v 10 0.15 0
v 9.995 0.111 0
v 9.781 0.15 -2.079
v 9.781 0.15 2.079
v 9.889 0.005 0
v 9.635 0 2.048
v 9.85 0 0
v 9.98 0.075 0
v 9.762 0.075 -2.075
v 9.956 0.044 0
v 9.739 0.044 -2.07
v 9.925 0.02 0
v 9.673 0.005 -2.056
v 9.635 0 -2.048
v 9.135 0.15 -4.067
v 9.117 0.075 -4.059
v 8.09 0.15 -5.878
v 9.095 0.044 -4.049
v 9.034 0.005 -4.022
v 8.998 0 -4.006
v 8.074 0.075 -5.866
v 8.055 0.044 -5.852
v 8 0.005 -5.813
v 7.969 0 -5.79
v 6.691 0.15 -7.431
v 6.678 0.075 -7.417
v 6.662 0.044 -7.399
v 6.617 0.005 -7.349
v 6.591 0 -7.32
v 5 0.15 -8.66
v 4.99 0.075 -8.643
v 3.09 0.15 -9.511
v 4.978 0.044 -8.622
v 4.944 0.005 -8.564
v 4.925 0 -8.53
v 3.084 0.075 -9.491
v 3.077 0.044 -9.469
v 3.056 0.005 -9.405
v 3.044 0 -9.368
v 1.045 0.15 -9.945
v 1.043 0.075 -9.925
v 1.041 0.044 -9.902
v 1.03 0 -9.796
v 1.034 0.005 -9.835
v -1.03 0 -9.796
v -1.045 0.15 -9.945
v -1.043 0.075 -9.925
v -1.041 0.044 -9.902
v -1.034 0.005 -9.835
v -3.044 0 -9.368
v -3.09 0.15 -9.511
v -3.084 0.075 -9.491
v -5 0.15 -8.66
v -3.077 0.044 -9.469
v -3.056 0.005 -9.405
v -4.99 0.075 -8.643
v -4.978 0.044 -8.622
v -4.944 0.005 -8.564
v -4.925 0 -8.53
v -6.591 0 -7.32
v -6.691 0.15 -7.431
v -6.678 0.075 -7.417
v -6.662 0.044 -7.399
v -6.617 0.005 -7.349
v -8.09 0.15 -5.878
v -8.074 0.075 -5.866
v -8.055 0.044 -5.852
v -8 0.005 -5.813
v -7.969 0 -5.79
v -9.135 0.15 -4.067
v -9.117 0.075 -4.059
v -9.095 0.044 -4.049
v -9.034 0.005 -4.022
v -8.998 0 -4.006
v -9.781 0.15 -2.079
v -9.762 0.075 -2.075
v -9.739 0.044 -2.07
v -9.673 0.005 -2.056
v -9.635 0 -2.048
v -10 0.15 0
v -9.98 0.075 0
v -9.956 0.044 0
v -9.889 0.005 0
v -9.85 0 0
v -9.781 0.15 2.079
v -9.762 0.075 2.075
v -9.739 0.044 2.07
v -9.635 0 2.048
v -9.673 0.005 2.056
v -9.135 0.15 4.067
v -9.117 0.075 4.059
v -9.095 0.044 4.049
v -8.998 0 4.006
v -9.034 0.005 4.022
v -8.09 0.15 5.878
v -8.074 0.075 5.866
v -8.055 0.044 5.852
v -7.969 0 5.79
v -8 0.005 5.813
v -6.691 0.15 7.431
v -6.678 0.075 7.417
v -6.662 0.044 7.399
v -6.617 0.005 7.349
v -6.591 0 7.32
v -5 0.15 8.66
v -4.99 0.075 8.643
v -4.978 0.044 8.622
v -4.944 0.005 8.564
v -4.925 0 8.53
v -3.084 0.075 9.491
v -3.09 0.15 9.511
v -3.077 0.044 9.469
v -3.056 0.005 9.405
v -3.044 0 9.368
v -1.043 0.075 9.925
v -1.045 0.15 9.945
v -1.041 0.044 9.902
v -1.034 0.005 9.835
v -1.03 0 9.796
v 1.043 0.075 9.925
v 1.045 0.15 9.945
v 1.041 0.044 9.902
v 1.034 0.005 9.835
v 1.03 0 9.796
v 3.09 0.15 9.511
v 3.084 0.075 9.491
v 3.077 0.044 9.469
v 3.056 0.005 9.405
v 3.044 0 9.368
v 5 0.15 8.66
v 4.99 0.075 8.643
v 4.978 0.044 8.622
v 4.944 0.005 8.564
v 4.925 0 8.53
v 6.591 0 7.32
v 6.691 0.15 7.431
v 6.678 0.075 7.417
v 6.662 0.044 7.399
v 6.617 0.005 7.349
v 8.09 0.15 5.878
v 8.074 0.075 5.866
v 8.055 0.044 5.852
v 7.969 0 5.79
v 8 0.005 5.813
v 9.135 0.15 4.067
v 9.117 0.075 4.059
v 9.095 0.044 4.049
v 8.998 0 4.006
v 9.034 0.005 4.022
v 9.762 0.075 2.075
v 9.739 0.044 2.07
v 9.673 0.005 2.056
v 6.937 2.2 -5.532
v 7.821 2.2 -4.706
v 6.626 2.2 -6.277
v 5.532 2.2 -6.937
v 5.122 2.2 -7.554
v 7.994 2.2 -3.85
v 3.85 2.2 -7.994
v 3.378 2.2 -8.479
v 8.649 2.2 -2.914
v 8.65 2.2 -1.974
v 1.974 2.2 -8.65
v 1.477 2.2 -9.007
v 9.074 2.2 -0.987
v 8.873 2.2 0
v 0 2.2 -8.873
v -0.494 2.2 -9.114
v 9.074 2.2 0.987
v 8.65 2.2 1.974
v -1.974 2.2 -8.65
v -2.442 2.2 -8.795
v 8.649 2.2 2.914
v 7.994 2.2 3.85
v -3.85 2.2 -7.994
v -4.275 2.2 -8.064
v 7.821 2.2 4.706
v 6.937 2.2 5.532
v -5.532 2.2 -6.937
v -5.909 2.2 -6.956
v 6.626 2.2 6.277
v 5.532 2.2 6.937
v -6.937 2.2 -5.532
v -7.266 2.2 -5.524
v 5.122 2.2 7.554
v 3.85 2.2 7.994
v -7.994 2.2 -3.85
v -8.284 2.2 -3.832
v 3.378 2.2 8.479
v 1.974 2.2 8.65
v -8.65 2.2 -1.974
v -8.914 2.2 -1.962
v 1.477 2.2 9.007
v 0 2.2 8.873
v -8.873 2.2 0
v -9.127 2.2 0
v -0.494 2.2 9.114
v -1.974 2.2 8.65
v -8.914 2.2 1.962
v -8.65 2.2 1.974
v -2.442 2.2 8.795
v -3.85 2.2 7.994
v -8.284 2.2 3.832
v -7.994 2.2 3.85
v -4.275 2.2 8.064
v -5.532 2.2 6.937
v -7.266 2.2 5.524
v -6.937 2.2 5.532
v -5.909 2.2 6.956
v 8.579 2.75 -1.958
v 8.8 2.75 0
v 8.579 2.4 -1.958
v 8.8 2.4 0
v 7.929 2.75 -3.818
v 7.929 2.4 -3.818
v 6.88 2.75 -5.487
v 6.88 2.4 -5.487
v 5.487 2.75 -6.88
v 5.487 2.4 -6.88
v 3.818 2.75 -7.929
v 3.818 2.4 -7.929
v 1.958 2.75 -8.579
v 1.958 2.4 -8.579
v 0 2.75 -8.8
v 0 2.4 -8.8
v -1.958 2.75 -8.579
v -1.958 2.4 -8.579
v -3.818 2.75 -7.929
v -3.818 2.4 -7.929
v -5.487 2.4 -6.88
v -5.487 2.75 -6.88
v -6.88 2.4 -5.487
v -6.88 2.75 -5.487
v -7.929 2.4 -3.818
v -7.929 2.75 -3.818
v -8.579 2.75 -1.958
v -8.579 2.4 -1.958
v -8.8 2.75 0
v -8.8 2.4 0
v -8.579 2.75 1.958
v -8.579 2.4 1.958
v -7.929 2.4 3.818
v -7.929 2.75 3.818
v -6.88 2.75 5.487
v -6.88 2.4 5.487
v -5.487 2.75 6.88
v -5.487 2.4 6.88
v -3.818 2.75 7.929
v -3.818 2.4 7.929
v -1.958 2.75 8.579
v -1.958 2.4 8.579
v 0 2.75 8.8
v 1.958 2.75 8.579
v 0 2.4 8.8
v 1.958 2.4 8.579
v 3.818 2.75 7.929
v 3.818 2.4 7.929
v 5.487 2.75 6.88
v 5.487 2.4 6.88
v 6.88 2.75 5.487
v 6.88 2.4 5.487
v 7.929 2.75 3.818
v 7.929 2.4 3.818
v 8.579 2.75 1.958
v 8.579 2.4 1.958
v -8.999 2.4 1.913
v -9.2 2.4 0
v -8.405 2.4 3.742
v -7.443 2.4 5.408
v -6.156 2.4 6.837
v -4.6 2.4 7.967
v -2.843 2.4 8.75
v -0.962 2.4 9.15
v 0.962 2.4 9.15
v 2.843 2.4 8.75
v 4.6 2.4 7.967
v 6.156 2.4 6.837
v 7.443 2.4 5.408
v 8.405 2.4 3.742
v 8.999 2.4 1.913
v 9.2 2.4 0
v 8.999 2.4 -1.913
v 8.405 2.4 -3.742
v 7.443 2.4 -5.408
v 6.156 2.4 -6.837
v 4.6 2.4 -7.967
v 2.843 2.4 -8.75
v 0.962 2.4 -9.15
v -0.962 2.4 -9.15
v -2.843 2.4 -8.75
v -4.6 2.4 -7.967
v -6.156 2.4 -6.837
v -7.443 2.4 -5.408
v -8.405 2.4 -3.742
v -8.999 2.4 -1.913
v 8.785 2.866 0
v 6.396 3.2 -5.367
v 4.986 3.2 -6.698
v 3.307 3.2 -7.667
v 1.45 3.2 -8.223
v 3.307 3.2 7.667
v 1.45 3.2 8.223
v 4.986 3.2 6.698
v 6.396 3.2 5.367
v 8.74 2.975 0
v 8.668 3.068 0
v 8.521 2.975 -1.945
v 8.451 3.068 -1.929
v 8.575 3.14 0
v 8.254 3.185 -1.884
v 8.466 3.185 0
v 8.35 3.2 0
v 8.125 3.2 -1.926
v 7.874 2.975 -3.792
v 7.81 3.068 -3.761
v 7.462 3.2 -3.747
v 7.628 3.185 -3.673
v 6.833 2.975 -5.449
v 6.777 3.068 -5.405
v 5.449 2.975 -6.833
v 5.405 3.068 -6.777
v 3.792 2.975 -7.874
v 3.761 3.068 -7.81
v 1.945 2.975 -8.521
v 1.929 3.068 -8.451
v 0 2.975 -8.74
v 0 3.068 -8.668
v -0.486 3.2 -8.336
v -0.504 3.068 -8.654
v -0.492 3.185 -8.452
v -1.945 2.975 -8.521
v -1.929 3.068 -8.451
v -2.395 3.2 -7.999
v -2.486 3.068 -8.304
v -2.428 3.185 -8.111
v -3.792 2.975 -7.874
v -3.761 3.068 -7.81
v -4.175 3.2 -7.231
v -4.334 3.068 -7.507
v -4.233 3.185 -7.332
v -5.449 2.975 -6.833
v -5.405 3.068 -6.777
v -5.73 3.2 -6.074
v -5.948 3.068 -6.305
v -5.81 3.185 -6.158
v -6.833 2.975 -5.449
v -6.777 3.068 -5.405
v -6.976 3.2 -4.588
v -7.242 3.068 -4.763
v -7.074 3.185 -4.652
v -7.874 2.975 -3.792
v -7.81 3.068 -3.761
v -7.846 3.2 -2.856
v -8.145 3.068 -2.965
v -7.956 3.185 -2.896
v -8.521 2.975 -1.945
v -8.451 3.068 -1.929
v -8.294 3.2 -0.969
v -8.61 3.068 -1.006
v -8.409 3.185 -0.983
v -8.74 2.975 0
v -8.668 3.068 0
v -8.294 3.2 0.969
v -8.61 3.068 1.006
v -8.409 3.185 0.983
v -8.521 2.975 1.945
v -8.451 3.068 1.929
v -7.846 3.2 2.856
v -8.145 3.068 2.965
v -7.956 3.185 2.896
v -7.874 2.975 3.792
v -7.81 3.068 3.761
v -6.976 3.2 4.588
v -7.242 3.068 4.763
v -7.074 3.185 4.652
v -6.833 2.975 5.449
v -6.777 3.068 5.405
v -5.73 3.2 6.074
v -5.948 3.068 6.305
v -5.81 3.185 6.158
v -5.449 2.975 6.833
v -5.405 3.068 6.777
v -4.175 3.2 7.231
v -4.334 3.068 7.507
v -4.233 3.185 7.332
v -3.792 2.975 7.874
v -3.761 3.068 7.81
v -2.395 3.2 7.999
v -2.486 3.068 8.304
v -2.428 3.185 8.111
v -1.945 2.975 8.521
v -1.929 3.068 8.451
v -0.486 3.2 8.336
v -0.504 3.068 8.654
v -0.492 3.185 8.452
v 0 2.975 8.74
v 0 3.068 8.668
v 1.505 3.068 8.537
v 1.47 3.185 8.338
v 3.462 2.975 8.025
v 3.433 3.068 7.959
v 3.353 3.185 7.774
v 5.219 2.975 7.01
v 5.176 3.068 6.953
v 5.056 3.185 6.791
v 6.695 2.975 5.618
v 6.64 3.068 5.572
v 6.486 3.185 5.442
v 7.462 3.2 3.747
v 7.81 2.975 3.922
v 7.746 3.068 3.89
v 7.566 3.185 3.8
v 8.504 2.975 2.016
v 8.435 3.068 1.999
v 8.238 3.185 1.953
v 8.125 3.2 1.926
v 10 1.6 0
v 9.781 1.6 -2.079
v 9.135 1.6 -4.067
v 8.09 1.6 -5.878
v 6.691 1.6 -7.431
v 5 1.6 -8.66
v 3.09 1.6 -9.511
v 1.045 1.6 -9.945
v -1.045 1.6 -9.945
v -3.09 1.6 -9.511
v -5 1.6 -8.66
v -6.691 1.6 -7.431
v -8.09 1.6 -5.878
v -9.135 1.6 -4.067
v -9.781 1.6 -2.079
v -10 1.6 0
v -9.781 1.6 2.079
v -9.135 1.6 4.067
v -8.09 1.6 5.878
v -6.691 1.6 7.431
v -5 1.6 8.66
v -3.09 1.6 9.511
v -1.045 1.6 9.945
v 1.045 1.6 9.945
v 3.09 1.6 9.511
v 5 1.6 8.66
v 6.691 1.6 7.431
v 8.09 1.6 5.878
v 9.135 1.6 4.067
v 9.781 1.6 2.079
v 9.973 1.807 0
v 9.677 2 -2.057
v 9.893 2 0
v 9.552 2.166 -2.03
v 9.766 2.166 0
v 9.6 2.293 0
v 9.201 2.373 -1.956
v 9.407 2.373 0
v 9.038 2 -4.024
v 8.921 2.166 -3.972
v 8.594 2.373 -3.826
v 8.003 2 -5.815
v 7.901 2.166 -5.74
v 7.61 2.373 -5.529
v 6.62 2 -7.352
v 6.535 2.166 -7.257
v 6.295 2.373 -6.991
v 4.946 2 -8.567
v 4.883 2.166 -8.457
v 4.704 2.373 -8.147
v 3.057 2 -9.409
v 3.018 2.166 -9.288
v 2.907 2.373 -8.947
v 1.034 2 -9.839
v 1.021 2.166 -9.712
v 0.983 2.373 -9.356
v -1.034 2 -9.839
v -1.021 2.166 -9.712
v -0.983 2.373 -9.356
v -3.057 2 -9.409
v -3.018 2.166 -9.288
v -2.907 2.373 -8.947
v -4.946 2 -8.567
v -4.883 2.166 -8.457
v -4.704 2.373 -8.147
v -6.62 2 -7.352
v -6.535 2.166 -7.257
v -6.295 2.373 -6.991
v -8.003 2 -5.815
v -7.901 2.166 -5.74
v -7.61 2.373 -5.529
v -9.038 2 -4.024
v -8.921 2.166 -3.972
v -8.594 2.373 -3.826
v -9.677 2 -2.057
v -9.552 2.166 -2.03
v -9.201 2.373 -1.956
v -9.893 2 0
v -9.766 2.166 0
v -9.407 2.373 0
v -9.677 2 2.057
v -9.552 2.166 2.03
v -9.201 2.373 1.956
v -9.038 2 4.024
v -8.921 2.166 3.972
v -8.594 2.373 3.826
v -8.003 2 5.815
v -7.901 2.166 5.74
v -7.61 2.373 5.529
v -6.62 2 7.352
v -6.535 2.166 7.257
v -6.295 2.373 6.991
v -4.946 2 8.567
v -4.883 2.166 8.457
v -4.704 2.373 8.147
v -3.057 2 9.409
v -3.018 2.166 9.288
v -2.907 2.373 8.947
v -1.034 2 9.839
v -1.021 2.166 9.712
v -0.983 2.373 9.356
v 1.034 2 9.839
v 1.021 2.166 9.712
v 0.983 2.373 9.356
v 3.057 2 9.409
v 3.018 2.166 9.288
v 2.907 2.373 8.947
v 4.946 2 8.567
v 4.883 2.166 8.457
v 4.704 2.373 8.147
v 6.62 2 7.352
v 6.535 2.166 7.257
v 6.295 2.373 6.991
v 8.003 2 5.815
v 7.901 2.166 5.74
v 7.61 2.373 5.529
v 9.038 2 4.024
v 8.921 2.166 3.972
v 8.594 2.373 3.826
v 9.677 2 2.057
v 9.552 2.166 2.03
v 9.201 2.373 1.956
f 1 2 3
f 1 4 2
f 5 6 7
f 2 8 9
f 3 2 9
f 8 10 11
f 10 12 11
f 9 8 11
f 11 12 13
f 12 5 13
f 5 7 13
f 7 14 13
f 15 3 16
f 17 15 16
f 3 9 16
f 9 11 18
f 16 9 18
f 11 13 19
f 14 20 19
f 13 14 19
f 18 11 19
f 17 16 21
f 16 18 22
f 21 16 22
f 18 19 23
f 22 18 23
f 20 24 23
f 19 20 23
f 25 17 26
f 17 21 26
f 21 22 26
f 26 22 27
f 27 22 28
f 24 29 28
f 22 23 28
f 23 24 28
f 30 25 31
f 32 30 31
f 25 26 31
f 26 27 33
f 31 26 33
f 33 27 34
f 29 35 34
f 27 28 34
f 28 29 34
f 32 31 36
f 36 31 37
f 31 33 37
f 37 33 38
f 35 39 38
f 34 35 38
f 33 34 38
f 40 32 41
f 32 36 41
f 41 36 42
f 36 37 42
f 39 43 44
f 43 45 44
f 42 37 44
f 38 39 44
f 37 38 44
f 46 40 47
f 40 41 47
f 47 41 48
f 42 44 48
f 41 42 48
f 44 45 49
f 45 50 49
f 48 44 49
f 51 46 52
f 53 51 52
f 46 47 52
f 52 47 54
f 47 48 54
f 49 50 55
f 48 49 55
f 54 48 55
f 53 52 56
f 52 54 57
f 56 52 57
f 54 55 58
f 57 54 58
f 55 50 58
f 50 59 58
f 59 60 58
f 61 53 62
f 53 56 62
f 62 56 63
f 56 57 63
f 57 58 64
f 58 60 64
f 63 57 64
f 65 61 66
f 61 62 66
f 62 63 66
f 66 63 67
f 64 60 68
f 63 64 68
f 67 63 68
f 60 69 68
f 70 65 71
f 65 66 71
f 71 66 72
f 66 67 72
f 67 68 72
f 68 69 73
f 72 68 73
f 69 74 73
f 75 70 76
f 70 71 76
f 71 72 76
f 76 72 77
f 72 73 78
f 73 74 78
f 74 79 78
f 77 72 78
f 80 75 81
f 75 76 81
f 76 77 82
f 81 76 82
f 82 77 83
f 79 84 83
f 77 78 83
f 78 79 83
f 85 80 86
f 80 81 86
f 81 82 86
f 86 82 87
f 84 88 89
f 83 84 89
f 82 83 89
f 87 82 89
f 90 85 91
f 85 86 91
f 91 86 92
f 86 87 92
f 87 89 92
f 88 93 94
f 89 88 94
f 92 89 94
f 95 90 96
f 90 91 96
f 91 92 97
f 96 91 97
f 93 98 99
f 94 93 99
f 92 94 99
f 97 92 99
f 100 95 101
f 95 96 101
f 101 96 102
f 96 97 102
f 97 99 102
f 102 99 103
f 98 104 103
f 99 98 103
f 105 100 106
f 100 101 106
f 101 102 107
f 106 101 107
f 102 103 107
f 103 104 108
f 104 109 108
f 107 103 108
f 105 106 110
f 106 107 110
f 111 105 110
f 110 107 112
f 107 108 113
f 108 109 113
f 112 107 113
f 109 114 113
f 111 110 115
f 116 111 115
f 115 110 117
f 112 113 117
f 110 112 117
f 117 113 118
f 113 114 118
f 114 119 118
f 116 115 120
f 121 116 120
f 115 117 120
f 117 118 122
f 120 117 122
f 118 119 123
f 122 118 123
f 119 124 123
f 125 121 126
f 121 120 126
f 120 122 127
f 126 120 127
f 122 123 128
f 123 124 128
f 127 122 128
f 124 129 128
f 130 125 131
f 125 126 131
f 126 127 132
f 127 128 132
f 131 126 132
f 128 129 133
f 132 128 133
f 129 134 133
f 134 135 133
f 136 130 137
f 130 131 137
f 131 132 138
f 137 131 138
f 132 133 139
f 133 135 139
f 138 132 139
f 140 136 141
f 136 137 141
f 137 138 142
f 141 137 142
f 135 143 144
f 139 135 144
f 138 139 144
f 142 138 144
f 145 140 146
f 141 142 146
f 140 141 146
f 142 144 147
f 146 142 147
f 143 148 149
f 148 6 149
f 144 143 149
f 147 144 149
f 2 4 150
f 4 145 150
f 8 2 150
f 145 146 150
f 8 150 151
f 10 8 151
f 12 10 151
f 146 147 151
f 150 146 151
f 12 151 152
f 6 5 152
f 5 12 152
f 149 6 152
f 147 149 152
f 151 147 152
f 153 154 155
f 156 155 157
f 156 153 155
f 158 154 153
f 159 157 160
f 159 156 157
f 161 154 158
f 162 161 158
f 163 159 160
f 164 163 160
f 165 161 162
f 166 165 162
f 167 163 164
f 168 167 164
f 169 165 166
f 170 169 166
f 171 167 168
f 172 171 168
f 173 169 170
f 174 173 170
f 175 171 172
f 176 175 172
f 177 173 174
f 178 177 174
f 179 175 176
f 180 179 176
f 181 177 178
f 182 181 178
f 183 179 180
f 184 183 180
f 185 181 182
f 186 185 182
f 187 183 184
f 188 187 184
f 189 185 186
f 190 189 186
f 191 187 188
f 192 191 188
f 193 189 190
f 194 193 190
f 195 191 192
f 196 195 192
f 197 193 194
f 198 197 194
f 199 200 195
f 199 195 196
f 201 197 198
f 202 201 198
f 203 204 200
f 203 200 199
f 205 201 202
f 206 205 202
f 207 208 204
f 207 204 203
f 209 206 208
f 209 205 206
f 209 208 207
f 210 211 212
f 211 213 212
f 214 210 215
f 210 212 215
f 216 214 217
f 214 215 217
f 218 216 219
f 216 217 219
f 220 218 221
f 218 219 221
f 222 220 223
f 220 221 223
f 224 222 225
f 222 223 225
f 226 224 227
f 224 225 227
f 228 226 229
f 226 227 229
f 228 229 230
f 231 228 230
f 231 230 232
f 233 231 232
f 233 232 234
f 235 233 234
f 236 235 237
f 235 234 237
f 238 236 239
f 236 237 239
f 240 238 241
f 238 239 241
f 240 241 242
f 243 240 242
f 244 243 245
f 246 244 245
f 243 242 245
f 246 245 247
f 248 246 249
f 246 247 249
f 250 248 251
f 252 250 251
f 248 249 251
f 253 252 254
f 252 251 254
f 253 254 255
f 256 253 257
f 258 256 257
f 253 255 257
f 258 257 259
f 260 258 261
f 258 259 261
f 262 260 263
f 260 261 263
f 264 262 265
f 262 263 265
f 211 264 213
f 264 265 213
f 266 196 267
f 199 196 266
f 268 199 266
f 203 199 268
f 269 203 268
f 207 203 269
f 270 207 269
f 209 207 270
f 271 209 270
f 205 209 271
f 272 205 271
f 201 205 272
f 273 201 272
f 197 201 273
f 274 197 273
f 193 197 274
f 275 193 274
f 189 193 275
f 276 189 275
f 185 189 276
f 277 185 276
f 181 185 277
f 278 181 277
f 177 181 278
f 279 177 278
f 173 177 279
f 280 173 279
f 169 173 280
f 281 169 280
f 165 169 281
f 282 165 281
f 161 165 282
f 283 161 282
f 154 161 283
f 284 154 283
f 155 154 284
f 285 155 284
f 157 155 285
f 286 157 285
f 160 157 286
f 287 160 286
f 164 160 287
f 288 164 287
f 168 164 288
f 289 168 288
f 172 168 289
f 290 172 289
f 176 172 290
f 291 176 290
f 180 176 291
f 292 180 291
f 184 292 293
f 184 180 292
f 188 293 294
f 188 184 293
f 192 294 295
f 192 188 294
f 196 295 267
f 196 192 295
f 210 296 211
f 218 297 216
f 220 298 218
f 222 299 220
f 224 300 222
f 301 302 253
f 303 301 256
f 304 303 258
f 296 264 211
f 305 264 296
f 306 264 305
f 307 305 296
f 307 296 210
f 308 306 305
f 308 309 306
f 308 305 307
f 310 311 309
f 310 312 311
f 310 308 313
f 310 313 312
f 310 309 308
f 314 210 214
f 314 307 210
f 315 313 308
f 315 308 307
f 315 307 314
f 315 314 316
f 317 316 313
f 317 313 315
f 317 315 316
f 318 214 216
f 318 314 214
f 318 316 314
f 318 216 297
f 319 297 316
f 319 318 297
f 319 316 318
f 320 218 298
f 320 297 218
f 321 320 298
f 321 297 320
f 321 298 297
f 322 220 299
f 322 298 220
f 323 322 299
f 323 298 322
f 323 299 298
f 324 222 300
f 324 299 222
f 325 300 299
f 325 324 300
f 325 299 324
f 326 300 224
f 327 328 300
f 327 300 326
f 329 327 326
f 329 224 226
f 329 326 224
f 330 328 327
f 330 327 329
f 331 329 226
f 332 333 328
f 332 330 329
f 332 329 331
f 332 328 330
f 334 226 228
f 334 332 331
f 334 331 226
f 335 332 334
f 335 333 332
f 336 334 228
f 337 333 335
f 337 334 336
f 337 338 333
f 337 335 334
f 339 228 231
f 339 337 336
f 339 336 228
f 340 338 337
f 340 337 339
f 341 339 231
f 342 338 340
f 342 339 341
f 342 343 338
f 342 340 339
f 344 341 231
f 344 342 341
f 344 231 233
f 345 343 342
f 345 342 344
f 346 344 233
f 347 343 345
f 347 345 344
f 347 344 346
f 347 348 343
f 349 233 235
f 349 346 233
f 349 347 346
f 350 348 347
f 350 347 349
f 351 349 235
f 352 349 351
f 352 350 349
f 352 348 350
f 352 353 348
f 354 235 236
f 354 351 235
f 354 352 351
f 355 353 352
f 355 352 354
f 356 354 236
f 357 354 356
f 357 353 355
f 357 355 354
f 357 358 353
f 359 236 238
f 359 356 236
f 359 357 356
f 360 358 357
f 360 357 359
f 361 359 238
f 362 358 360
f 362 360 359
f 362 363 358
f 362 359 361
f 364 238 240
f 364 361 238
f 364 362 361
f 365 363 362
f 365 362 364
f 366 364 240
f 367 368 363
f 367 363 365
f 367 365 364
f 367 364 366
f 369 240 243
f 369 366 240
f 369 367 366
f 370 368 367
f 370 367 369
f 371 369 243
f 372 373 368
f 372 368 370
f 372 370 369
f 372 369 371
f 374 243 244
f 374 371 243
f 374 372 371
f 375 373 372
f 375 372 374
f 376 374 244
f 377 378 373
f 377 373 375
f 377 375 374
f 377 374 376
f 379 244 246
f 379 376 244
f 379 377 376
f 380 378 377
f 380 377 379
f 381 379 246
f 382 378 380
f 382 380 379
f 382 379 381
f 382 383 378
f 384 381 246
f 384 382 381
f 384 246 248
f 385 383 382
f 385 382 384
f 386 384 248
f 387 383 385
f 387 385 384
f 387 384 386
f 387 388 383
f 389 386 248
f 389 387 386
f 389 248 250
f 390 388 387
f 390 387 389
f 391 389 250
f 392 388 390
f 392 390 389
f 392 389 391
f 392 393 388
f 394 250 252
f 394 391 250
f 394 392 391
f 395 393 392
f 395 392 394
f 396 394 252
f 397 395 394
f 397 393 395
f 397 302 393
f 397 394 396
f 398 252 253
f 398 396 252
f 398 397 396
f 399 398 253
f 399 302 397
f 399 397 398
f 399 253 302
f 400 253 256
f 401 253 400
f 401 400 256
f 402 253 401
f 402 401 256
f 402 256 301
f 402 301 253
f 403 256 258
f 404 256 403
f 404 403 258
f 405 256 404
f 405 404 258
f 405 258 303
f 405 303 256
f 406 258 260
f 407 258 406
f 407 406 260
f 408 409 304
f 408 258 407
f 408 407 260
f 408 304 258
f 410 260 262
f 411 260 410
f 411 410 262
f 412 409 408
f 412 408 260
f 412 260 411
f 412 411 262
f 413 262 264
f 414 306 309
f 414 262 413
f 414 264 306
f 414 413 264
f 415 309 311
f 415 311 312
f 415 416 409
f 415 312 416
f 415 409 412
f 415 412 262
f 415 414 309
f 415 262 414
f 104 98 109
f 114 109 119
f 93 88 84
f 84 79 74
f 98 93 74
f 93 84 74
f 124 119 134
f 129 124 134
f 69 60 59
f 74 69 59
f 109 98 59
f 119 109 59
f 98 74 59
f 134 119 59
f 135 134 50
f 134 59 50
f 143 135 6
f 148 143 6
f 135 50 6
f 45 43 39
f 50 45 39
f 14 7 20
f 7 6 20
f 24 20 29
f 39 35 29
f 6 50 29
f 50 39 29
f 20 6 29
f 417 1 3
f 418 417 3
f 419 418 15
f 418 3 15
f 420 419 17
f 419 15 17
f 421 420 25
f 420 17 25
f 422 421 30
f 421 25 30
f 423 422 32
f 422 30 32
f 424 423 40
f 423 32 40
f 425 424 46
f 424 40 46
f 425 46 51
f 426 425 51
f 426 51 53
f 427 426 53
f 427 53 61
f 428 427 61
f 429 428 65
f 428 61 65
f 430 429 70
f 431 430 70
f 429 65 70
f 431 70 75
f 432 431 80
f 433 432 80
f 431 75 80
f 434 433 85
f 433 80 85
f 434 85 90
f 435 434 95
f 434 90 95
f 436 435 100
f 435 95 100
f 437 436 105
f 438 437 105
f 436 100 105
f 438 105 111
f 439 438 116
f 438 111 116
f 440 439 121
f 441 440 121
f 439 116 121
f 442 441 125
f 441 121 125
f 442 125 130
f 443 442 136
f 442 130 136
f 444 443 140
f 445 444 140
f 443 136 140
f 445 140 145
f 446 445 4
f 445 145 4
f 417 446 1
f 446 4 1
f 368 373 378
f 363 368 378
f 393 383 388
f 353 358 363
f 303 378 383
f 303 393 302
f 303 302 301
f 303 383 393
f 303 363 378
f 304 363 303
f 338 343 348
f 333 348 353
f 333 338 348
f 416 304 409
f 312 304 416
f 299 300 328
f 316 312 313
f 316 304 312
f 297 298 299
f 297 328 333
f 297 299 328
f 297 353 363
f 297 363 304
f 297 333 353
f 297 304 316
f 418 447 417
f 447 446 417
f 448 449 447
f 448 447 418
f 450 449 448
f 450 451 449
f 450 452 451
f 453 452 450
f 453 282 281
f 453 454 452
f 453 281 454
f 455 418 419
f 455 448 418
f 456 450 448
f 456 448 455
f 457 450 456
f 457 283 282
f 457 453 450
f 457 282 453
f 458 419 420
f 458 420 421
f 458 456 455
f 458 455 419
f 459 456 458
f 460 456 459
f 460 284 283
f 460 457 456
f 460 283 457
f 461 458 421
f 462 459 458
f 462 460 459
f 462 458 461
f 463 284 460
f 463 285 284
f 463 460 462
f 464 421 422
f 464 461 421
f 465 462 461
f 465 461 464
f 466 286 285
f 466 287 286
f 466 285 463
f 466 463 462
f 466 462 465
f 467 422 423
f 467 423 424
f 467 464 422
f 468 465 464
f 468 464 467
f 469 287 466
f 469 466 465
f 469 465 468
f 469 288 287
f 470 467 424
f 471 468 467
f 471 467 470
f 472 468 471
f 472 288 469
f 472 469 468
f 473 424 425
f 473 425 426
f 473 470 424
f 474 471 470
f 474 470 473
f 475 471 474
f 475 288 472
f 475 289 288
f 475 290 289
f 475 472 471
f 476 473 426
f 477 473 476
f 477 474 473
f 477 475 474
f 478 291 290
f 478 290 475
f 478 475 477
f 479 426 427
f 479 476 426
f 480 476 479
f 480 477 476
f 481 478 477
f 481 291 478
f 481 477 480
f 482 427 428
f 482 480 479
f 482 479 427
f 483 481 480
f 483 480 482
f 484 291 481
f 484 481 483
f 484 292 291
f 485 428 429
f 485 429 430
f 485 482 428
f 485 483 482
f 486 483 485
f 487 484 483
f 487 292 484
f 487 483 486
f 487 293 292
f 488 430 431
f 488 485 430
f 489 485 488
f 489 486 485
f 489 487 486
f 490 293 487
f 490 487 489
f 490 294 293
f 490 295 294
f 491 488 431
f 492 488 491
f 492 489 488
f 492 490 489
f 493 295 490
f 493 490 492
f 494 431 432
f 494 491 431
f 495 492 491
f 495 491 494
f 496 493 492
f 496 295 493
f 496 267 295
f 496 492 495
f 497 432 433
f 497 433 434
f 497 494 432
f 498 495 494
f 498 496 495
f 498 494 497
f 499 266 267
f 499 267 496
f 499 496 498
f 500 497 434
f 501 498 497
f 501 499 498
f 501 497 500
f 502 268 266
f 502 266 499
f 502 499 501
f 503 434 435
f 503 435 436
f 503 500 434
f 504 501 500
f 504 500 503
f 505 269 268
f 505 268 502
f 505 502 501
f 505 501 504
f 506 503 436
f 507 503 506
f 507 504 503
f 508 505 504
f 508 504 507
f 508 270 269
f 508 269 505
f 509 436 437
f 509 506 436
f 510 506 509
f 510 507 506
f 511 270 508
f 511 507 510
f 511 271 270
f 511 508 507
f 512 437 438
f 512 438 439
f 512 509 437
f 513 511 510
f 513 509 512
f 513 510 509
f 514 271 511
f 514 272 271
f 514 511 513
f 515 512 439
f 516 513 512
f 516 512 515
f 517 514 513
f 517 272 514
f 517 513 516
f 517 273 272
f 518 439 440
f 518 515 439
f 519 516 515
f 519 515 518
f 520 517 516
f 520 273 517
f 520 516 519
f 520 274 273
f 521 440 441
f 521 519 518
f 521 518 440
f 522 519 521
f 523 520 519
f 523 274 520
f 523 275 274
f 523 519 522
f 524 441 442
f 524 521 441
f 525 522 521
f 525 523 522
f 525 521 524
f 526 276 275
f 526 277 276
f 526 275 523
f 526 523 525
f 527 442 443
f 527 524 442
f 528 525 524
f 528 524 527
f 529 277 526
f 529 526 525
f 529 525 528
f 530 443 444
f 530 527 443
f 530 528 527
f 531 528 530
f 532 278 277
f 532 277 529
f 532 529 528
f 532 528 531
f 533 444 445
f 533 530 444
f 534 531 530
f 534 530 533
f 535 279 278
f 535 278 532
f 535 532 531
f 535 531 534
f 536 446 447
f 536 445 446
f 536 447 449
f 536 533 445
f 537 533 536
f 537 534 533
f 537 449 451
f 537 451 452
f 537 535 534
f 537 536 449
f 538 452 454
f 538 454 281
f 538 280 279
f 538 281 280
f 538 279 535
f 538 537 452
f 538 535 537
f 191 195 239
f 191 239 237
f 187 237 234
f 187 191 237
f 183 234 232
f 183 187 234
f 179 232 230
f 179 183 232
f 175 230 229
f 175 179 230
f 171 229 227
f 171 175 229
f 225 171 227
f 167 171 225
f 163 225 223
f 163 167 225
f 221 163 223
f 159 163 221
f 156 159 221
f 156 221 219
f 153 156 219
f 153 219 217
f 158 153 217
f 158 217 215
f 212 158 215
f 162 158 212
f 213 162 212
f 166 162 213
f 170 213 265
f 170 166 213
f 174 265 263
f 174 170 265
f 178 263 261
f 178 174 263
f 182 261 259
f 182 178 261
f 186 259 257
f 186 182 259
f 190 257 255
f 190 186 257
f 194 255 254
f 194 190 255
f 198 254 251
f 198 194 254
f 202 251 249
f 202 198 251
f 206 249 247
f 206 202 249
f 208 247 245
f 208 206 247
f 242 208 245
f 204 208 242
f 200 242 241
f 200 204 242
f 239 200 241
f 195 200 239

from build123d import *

# Parameters (mm, degrees)
SKETCH1_R          = 10
EXTRUDE1_DEPTH     = 2.4
SKETCH2_R          = 8.8
EXTRUDE2_DEPTH     = 3.2
FILLET1_R          = 0.8
FILLET2_R          = 0.15
FILLET3_R          = 0.45
SKETCH3_R          = 9.2
SKETCH3_R_2        = 8.8
CUT_EXTRUDE2_DEPTH = 0.2
CUT_EXTRUDE2_TAPER = 20


with BuildPart() as part:
    # Sketch1 → Extrude1 (new body)
    with BuildSketch(Plane(origin=(0, 0, 0), x_dir=(1, 0, 0), z_dir=(0, 1, 0))):
        Circle(SKETCH1_R)
    extrude(amount=EXTRUDE1_DEPTH)

    # Sketch2 → Extrude2 (add)
    with BuildSketch(Plane(origin=(0, 0, 0), x_dir=(1, 0, 0), z_dir=(0, 1, 0))):
        Circle(SKETCH2_R)
    extrude(amount=EXTRUDE2_DEPTH)

    # Fillet1
    fillet1_edges = [part.edges().sort_by_distance(p)[0] for p in [
        (-10, 2.4, 0),
    ]]
    fillet(fillet1_edges, radius=FILLET1_R)

    # Fillet2
    fillet2_edges = [part.edges().sort_by_distance(p)[0] for p in [
        (-10, 0, 0),
    ]]
    fillet(fillet2_edges, radius=FILLET2_R)

    # Fillet3
    fillet3_edges = [part.edges().sort_by_distance(p)[0] for p in [
        (-8.8, 3.2, 0),
    ]]
    fillet(fillet3_edges, radius=FILLET3_R)

    # Sketch3 → Cut-Extrude2 (cut)
    with BuildSketch(Plane(origin=(0, 2.4, 0), x_dir=(-1, 0, 0), z_dir=(0, 1, 0))):
        Circle(SKETCH3_R)
        Circle(SKETCH3_R_2, mode=Mode.SUBTRACT)
    extrude(amount=-CUT_EXTRUDE2_DEPTH, taper=CUT_EXTRUDE2_TAPER, mode=Mode.SUBTRACT)


solid = part.part
